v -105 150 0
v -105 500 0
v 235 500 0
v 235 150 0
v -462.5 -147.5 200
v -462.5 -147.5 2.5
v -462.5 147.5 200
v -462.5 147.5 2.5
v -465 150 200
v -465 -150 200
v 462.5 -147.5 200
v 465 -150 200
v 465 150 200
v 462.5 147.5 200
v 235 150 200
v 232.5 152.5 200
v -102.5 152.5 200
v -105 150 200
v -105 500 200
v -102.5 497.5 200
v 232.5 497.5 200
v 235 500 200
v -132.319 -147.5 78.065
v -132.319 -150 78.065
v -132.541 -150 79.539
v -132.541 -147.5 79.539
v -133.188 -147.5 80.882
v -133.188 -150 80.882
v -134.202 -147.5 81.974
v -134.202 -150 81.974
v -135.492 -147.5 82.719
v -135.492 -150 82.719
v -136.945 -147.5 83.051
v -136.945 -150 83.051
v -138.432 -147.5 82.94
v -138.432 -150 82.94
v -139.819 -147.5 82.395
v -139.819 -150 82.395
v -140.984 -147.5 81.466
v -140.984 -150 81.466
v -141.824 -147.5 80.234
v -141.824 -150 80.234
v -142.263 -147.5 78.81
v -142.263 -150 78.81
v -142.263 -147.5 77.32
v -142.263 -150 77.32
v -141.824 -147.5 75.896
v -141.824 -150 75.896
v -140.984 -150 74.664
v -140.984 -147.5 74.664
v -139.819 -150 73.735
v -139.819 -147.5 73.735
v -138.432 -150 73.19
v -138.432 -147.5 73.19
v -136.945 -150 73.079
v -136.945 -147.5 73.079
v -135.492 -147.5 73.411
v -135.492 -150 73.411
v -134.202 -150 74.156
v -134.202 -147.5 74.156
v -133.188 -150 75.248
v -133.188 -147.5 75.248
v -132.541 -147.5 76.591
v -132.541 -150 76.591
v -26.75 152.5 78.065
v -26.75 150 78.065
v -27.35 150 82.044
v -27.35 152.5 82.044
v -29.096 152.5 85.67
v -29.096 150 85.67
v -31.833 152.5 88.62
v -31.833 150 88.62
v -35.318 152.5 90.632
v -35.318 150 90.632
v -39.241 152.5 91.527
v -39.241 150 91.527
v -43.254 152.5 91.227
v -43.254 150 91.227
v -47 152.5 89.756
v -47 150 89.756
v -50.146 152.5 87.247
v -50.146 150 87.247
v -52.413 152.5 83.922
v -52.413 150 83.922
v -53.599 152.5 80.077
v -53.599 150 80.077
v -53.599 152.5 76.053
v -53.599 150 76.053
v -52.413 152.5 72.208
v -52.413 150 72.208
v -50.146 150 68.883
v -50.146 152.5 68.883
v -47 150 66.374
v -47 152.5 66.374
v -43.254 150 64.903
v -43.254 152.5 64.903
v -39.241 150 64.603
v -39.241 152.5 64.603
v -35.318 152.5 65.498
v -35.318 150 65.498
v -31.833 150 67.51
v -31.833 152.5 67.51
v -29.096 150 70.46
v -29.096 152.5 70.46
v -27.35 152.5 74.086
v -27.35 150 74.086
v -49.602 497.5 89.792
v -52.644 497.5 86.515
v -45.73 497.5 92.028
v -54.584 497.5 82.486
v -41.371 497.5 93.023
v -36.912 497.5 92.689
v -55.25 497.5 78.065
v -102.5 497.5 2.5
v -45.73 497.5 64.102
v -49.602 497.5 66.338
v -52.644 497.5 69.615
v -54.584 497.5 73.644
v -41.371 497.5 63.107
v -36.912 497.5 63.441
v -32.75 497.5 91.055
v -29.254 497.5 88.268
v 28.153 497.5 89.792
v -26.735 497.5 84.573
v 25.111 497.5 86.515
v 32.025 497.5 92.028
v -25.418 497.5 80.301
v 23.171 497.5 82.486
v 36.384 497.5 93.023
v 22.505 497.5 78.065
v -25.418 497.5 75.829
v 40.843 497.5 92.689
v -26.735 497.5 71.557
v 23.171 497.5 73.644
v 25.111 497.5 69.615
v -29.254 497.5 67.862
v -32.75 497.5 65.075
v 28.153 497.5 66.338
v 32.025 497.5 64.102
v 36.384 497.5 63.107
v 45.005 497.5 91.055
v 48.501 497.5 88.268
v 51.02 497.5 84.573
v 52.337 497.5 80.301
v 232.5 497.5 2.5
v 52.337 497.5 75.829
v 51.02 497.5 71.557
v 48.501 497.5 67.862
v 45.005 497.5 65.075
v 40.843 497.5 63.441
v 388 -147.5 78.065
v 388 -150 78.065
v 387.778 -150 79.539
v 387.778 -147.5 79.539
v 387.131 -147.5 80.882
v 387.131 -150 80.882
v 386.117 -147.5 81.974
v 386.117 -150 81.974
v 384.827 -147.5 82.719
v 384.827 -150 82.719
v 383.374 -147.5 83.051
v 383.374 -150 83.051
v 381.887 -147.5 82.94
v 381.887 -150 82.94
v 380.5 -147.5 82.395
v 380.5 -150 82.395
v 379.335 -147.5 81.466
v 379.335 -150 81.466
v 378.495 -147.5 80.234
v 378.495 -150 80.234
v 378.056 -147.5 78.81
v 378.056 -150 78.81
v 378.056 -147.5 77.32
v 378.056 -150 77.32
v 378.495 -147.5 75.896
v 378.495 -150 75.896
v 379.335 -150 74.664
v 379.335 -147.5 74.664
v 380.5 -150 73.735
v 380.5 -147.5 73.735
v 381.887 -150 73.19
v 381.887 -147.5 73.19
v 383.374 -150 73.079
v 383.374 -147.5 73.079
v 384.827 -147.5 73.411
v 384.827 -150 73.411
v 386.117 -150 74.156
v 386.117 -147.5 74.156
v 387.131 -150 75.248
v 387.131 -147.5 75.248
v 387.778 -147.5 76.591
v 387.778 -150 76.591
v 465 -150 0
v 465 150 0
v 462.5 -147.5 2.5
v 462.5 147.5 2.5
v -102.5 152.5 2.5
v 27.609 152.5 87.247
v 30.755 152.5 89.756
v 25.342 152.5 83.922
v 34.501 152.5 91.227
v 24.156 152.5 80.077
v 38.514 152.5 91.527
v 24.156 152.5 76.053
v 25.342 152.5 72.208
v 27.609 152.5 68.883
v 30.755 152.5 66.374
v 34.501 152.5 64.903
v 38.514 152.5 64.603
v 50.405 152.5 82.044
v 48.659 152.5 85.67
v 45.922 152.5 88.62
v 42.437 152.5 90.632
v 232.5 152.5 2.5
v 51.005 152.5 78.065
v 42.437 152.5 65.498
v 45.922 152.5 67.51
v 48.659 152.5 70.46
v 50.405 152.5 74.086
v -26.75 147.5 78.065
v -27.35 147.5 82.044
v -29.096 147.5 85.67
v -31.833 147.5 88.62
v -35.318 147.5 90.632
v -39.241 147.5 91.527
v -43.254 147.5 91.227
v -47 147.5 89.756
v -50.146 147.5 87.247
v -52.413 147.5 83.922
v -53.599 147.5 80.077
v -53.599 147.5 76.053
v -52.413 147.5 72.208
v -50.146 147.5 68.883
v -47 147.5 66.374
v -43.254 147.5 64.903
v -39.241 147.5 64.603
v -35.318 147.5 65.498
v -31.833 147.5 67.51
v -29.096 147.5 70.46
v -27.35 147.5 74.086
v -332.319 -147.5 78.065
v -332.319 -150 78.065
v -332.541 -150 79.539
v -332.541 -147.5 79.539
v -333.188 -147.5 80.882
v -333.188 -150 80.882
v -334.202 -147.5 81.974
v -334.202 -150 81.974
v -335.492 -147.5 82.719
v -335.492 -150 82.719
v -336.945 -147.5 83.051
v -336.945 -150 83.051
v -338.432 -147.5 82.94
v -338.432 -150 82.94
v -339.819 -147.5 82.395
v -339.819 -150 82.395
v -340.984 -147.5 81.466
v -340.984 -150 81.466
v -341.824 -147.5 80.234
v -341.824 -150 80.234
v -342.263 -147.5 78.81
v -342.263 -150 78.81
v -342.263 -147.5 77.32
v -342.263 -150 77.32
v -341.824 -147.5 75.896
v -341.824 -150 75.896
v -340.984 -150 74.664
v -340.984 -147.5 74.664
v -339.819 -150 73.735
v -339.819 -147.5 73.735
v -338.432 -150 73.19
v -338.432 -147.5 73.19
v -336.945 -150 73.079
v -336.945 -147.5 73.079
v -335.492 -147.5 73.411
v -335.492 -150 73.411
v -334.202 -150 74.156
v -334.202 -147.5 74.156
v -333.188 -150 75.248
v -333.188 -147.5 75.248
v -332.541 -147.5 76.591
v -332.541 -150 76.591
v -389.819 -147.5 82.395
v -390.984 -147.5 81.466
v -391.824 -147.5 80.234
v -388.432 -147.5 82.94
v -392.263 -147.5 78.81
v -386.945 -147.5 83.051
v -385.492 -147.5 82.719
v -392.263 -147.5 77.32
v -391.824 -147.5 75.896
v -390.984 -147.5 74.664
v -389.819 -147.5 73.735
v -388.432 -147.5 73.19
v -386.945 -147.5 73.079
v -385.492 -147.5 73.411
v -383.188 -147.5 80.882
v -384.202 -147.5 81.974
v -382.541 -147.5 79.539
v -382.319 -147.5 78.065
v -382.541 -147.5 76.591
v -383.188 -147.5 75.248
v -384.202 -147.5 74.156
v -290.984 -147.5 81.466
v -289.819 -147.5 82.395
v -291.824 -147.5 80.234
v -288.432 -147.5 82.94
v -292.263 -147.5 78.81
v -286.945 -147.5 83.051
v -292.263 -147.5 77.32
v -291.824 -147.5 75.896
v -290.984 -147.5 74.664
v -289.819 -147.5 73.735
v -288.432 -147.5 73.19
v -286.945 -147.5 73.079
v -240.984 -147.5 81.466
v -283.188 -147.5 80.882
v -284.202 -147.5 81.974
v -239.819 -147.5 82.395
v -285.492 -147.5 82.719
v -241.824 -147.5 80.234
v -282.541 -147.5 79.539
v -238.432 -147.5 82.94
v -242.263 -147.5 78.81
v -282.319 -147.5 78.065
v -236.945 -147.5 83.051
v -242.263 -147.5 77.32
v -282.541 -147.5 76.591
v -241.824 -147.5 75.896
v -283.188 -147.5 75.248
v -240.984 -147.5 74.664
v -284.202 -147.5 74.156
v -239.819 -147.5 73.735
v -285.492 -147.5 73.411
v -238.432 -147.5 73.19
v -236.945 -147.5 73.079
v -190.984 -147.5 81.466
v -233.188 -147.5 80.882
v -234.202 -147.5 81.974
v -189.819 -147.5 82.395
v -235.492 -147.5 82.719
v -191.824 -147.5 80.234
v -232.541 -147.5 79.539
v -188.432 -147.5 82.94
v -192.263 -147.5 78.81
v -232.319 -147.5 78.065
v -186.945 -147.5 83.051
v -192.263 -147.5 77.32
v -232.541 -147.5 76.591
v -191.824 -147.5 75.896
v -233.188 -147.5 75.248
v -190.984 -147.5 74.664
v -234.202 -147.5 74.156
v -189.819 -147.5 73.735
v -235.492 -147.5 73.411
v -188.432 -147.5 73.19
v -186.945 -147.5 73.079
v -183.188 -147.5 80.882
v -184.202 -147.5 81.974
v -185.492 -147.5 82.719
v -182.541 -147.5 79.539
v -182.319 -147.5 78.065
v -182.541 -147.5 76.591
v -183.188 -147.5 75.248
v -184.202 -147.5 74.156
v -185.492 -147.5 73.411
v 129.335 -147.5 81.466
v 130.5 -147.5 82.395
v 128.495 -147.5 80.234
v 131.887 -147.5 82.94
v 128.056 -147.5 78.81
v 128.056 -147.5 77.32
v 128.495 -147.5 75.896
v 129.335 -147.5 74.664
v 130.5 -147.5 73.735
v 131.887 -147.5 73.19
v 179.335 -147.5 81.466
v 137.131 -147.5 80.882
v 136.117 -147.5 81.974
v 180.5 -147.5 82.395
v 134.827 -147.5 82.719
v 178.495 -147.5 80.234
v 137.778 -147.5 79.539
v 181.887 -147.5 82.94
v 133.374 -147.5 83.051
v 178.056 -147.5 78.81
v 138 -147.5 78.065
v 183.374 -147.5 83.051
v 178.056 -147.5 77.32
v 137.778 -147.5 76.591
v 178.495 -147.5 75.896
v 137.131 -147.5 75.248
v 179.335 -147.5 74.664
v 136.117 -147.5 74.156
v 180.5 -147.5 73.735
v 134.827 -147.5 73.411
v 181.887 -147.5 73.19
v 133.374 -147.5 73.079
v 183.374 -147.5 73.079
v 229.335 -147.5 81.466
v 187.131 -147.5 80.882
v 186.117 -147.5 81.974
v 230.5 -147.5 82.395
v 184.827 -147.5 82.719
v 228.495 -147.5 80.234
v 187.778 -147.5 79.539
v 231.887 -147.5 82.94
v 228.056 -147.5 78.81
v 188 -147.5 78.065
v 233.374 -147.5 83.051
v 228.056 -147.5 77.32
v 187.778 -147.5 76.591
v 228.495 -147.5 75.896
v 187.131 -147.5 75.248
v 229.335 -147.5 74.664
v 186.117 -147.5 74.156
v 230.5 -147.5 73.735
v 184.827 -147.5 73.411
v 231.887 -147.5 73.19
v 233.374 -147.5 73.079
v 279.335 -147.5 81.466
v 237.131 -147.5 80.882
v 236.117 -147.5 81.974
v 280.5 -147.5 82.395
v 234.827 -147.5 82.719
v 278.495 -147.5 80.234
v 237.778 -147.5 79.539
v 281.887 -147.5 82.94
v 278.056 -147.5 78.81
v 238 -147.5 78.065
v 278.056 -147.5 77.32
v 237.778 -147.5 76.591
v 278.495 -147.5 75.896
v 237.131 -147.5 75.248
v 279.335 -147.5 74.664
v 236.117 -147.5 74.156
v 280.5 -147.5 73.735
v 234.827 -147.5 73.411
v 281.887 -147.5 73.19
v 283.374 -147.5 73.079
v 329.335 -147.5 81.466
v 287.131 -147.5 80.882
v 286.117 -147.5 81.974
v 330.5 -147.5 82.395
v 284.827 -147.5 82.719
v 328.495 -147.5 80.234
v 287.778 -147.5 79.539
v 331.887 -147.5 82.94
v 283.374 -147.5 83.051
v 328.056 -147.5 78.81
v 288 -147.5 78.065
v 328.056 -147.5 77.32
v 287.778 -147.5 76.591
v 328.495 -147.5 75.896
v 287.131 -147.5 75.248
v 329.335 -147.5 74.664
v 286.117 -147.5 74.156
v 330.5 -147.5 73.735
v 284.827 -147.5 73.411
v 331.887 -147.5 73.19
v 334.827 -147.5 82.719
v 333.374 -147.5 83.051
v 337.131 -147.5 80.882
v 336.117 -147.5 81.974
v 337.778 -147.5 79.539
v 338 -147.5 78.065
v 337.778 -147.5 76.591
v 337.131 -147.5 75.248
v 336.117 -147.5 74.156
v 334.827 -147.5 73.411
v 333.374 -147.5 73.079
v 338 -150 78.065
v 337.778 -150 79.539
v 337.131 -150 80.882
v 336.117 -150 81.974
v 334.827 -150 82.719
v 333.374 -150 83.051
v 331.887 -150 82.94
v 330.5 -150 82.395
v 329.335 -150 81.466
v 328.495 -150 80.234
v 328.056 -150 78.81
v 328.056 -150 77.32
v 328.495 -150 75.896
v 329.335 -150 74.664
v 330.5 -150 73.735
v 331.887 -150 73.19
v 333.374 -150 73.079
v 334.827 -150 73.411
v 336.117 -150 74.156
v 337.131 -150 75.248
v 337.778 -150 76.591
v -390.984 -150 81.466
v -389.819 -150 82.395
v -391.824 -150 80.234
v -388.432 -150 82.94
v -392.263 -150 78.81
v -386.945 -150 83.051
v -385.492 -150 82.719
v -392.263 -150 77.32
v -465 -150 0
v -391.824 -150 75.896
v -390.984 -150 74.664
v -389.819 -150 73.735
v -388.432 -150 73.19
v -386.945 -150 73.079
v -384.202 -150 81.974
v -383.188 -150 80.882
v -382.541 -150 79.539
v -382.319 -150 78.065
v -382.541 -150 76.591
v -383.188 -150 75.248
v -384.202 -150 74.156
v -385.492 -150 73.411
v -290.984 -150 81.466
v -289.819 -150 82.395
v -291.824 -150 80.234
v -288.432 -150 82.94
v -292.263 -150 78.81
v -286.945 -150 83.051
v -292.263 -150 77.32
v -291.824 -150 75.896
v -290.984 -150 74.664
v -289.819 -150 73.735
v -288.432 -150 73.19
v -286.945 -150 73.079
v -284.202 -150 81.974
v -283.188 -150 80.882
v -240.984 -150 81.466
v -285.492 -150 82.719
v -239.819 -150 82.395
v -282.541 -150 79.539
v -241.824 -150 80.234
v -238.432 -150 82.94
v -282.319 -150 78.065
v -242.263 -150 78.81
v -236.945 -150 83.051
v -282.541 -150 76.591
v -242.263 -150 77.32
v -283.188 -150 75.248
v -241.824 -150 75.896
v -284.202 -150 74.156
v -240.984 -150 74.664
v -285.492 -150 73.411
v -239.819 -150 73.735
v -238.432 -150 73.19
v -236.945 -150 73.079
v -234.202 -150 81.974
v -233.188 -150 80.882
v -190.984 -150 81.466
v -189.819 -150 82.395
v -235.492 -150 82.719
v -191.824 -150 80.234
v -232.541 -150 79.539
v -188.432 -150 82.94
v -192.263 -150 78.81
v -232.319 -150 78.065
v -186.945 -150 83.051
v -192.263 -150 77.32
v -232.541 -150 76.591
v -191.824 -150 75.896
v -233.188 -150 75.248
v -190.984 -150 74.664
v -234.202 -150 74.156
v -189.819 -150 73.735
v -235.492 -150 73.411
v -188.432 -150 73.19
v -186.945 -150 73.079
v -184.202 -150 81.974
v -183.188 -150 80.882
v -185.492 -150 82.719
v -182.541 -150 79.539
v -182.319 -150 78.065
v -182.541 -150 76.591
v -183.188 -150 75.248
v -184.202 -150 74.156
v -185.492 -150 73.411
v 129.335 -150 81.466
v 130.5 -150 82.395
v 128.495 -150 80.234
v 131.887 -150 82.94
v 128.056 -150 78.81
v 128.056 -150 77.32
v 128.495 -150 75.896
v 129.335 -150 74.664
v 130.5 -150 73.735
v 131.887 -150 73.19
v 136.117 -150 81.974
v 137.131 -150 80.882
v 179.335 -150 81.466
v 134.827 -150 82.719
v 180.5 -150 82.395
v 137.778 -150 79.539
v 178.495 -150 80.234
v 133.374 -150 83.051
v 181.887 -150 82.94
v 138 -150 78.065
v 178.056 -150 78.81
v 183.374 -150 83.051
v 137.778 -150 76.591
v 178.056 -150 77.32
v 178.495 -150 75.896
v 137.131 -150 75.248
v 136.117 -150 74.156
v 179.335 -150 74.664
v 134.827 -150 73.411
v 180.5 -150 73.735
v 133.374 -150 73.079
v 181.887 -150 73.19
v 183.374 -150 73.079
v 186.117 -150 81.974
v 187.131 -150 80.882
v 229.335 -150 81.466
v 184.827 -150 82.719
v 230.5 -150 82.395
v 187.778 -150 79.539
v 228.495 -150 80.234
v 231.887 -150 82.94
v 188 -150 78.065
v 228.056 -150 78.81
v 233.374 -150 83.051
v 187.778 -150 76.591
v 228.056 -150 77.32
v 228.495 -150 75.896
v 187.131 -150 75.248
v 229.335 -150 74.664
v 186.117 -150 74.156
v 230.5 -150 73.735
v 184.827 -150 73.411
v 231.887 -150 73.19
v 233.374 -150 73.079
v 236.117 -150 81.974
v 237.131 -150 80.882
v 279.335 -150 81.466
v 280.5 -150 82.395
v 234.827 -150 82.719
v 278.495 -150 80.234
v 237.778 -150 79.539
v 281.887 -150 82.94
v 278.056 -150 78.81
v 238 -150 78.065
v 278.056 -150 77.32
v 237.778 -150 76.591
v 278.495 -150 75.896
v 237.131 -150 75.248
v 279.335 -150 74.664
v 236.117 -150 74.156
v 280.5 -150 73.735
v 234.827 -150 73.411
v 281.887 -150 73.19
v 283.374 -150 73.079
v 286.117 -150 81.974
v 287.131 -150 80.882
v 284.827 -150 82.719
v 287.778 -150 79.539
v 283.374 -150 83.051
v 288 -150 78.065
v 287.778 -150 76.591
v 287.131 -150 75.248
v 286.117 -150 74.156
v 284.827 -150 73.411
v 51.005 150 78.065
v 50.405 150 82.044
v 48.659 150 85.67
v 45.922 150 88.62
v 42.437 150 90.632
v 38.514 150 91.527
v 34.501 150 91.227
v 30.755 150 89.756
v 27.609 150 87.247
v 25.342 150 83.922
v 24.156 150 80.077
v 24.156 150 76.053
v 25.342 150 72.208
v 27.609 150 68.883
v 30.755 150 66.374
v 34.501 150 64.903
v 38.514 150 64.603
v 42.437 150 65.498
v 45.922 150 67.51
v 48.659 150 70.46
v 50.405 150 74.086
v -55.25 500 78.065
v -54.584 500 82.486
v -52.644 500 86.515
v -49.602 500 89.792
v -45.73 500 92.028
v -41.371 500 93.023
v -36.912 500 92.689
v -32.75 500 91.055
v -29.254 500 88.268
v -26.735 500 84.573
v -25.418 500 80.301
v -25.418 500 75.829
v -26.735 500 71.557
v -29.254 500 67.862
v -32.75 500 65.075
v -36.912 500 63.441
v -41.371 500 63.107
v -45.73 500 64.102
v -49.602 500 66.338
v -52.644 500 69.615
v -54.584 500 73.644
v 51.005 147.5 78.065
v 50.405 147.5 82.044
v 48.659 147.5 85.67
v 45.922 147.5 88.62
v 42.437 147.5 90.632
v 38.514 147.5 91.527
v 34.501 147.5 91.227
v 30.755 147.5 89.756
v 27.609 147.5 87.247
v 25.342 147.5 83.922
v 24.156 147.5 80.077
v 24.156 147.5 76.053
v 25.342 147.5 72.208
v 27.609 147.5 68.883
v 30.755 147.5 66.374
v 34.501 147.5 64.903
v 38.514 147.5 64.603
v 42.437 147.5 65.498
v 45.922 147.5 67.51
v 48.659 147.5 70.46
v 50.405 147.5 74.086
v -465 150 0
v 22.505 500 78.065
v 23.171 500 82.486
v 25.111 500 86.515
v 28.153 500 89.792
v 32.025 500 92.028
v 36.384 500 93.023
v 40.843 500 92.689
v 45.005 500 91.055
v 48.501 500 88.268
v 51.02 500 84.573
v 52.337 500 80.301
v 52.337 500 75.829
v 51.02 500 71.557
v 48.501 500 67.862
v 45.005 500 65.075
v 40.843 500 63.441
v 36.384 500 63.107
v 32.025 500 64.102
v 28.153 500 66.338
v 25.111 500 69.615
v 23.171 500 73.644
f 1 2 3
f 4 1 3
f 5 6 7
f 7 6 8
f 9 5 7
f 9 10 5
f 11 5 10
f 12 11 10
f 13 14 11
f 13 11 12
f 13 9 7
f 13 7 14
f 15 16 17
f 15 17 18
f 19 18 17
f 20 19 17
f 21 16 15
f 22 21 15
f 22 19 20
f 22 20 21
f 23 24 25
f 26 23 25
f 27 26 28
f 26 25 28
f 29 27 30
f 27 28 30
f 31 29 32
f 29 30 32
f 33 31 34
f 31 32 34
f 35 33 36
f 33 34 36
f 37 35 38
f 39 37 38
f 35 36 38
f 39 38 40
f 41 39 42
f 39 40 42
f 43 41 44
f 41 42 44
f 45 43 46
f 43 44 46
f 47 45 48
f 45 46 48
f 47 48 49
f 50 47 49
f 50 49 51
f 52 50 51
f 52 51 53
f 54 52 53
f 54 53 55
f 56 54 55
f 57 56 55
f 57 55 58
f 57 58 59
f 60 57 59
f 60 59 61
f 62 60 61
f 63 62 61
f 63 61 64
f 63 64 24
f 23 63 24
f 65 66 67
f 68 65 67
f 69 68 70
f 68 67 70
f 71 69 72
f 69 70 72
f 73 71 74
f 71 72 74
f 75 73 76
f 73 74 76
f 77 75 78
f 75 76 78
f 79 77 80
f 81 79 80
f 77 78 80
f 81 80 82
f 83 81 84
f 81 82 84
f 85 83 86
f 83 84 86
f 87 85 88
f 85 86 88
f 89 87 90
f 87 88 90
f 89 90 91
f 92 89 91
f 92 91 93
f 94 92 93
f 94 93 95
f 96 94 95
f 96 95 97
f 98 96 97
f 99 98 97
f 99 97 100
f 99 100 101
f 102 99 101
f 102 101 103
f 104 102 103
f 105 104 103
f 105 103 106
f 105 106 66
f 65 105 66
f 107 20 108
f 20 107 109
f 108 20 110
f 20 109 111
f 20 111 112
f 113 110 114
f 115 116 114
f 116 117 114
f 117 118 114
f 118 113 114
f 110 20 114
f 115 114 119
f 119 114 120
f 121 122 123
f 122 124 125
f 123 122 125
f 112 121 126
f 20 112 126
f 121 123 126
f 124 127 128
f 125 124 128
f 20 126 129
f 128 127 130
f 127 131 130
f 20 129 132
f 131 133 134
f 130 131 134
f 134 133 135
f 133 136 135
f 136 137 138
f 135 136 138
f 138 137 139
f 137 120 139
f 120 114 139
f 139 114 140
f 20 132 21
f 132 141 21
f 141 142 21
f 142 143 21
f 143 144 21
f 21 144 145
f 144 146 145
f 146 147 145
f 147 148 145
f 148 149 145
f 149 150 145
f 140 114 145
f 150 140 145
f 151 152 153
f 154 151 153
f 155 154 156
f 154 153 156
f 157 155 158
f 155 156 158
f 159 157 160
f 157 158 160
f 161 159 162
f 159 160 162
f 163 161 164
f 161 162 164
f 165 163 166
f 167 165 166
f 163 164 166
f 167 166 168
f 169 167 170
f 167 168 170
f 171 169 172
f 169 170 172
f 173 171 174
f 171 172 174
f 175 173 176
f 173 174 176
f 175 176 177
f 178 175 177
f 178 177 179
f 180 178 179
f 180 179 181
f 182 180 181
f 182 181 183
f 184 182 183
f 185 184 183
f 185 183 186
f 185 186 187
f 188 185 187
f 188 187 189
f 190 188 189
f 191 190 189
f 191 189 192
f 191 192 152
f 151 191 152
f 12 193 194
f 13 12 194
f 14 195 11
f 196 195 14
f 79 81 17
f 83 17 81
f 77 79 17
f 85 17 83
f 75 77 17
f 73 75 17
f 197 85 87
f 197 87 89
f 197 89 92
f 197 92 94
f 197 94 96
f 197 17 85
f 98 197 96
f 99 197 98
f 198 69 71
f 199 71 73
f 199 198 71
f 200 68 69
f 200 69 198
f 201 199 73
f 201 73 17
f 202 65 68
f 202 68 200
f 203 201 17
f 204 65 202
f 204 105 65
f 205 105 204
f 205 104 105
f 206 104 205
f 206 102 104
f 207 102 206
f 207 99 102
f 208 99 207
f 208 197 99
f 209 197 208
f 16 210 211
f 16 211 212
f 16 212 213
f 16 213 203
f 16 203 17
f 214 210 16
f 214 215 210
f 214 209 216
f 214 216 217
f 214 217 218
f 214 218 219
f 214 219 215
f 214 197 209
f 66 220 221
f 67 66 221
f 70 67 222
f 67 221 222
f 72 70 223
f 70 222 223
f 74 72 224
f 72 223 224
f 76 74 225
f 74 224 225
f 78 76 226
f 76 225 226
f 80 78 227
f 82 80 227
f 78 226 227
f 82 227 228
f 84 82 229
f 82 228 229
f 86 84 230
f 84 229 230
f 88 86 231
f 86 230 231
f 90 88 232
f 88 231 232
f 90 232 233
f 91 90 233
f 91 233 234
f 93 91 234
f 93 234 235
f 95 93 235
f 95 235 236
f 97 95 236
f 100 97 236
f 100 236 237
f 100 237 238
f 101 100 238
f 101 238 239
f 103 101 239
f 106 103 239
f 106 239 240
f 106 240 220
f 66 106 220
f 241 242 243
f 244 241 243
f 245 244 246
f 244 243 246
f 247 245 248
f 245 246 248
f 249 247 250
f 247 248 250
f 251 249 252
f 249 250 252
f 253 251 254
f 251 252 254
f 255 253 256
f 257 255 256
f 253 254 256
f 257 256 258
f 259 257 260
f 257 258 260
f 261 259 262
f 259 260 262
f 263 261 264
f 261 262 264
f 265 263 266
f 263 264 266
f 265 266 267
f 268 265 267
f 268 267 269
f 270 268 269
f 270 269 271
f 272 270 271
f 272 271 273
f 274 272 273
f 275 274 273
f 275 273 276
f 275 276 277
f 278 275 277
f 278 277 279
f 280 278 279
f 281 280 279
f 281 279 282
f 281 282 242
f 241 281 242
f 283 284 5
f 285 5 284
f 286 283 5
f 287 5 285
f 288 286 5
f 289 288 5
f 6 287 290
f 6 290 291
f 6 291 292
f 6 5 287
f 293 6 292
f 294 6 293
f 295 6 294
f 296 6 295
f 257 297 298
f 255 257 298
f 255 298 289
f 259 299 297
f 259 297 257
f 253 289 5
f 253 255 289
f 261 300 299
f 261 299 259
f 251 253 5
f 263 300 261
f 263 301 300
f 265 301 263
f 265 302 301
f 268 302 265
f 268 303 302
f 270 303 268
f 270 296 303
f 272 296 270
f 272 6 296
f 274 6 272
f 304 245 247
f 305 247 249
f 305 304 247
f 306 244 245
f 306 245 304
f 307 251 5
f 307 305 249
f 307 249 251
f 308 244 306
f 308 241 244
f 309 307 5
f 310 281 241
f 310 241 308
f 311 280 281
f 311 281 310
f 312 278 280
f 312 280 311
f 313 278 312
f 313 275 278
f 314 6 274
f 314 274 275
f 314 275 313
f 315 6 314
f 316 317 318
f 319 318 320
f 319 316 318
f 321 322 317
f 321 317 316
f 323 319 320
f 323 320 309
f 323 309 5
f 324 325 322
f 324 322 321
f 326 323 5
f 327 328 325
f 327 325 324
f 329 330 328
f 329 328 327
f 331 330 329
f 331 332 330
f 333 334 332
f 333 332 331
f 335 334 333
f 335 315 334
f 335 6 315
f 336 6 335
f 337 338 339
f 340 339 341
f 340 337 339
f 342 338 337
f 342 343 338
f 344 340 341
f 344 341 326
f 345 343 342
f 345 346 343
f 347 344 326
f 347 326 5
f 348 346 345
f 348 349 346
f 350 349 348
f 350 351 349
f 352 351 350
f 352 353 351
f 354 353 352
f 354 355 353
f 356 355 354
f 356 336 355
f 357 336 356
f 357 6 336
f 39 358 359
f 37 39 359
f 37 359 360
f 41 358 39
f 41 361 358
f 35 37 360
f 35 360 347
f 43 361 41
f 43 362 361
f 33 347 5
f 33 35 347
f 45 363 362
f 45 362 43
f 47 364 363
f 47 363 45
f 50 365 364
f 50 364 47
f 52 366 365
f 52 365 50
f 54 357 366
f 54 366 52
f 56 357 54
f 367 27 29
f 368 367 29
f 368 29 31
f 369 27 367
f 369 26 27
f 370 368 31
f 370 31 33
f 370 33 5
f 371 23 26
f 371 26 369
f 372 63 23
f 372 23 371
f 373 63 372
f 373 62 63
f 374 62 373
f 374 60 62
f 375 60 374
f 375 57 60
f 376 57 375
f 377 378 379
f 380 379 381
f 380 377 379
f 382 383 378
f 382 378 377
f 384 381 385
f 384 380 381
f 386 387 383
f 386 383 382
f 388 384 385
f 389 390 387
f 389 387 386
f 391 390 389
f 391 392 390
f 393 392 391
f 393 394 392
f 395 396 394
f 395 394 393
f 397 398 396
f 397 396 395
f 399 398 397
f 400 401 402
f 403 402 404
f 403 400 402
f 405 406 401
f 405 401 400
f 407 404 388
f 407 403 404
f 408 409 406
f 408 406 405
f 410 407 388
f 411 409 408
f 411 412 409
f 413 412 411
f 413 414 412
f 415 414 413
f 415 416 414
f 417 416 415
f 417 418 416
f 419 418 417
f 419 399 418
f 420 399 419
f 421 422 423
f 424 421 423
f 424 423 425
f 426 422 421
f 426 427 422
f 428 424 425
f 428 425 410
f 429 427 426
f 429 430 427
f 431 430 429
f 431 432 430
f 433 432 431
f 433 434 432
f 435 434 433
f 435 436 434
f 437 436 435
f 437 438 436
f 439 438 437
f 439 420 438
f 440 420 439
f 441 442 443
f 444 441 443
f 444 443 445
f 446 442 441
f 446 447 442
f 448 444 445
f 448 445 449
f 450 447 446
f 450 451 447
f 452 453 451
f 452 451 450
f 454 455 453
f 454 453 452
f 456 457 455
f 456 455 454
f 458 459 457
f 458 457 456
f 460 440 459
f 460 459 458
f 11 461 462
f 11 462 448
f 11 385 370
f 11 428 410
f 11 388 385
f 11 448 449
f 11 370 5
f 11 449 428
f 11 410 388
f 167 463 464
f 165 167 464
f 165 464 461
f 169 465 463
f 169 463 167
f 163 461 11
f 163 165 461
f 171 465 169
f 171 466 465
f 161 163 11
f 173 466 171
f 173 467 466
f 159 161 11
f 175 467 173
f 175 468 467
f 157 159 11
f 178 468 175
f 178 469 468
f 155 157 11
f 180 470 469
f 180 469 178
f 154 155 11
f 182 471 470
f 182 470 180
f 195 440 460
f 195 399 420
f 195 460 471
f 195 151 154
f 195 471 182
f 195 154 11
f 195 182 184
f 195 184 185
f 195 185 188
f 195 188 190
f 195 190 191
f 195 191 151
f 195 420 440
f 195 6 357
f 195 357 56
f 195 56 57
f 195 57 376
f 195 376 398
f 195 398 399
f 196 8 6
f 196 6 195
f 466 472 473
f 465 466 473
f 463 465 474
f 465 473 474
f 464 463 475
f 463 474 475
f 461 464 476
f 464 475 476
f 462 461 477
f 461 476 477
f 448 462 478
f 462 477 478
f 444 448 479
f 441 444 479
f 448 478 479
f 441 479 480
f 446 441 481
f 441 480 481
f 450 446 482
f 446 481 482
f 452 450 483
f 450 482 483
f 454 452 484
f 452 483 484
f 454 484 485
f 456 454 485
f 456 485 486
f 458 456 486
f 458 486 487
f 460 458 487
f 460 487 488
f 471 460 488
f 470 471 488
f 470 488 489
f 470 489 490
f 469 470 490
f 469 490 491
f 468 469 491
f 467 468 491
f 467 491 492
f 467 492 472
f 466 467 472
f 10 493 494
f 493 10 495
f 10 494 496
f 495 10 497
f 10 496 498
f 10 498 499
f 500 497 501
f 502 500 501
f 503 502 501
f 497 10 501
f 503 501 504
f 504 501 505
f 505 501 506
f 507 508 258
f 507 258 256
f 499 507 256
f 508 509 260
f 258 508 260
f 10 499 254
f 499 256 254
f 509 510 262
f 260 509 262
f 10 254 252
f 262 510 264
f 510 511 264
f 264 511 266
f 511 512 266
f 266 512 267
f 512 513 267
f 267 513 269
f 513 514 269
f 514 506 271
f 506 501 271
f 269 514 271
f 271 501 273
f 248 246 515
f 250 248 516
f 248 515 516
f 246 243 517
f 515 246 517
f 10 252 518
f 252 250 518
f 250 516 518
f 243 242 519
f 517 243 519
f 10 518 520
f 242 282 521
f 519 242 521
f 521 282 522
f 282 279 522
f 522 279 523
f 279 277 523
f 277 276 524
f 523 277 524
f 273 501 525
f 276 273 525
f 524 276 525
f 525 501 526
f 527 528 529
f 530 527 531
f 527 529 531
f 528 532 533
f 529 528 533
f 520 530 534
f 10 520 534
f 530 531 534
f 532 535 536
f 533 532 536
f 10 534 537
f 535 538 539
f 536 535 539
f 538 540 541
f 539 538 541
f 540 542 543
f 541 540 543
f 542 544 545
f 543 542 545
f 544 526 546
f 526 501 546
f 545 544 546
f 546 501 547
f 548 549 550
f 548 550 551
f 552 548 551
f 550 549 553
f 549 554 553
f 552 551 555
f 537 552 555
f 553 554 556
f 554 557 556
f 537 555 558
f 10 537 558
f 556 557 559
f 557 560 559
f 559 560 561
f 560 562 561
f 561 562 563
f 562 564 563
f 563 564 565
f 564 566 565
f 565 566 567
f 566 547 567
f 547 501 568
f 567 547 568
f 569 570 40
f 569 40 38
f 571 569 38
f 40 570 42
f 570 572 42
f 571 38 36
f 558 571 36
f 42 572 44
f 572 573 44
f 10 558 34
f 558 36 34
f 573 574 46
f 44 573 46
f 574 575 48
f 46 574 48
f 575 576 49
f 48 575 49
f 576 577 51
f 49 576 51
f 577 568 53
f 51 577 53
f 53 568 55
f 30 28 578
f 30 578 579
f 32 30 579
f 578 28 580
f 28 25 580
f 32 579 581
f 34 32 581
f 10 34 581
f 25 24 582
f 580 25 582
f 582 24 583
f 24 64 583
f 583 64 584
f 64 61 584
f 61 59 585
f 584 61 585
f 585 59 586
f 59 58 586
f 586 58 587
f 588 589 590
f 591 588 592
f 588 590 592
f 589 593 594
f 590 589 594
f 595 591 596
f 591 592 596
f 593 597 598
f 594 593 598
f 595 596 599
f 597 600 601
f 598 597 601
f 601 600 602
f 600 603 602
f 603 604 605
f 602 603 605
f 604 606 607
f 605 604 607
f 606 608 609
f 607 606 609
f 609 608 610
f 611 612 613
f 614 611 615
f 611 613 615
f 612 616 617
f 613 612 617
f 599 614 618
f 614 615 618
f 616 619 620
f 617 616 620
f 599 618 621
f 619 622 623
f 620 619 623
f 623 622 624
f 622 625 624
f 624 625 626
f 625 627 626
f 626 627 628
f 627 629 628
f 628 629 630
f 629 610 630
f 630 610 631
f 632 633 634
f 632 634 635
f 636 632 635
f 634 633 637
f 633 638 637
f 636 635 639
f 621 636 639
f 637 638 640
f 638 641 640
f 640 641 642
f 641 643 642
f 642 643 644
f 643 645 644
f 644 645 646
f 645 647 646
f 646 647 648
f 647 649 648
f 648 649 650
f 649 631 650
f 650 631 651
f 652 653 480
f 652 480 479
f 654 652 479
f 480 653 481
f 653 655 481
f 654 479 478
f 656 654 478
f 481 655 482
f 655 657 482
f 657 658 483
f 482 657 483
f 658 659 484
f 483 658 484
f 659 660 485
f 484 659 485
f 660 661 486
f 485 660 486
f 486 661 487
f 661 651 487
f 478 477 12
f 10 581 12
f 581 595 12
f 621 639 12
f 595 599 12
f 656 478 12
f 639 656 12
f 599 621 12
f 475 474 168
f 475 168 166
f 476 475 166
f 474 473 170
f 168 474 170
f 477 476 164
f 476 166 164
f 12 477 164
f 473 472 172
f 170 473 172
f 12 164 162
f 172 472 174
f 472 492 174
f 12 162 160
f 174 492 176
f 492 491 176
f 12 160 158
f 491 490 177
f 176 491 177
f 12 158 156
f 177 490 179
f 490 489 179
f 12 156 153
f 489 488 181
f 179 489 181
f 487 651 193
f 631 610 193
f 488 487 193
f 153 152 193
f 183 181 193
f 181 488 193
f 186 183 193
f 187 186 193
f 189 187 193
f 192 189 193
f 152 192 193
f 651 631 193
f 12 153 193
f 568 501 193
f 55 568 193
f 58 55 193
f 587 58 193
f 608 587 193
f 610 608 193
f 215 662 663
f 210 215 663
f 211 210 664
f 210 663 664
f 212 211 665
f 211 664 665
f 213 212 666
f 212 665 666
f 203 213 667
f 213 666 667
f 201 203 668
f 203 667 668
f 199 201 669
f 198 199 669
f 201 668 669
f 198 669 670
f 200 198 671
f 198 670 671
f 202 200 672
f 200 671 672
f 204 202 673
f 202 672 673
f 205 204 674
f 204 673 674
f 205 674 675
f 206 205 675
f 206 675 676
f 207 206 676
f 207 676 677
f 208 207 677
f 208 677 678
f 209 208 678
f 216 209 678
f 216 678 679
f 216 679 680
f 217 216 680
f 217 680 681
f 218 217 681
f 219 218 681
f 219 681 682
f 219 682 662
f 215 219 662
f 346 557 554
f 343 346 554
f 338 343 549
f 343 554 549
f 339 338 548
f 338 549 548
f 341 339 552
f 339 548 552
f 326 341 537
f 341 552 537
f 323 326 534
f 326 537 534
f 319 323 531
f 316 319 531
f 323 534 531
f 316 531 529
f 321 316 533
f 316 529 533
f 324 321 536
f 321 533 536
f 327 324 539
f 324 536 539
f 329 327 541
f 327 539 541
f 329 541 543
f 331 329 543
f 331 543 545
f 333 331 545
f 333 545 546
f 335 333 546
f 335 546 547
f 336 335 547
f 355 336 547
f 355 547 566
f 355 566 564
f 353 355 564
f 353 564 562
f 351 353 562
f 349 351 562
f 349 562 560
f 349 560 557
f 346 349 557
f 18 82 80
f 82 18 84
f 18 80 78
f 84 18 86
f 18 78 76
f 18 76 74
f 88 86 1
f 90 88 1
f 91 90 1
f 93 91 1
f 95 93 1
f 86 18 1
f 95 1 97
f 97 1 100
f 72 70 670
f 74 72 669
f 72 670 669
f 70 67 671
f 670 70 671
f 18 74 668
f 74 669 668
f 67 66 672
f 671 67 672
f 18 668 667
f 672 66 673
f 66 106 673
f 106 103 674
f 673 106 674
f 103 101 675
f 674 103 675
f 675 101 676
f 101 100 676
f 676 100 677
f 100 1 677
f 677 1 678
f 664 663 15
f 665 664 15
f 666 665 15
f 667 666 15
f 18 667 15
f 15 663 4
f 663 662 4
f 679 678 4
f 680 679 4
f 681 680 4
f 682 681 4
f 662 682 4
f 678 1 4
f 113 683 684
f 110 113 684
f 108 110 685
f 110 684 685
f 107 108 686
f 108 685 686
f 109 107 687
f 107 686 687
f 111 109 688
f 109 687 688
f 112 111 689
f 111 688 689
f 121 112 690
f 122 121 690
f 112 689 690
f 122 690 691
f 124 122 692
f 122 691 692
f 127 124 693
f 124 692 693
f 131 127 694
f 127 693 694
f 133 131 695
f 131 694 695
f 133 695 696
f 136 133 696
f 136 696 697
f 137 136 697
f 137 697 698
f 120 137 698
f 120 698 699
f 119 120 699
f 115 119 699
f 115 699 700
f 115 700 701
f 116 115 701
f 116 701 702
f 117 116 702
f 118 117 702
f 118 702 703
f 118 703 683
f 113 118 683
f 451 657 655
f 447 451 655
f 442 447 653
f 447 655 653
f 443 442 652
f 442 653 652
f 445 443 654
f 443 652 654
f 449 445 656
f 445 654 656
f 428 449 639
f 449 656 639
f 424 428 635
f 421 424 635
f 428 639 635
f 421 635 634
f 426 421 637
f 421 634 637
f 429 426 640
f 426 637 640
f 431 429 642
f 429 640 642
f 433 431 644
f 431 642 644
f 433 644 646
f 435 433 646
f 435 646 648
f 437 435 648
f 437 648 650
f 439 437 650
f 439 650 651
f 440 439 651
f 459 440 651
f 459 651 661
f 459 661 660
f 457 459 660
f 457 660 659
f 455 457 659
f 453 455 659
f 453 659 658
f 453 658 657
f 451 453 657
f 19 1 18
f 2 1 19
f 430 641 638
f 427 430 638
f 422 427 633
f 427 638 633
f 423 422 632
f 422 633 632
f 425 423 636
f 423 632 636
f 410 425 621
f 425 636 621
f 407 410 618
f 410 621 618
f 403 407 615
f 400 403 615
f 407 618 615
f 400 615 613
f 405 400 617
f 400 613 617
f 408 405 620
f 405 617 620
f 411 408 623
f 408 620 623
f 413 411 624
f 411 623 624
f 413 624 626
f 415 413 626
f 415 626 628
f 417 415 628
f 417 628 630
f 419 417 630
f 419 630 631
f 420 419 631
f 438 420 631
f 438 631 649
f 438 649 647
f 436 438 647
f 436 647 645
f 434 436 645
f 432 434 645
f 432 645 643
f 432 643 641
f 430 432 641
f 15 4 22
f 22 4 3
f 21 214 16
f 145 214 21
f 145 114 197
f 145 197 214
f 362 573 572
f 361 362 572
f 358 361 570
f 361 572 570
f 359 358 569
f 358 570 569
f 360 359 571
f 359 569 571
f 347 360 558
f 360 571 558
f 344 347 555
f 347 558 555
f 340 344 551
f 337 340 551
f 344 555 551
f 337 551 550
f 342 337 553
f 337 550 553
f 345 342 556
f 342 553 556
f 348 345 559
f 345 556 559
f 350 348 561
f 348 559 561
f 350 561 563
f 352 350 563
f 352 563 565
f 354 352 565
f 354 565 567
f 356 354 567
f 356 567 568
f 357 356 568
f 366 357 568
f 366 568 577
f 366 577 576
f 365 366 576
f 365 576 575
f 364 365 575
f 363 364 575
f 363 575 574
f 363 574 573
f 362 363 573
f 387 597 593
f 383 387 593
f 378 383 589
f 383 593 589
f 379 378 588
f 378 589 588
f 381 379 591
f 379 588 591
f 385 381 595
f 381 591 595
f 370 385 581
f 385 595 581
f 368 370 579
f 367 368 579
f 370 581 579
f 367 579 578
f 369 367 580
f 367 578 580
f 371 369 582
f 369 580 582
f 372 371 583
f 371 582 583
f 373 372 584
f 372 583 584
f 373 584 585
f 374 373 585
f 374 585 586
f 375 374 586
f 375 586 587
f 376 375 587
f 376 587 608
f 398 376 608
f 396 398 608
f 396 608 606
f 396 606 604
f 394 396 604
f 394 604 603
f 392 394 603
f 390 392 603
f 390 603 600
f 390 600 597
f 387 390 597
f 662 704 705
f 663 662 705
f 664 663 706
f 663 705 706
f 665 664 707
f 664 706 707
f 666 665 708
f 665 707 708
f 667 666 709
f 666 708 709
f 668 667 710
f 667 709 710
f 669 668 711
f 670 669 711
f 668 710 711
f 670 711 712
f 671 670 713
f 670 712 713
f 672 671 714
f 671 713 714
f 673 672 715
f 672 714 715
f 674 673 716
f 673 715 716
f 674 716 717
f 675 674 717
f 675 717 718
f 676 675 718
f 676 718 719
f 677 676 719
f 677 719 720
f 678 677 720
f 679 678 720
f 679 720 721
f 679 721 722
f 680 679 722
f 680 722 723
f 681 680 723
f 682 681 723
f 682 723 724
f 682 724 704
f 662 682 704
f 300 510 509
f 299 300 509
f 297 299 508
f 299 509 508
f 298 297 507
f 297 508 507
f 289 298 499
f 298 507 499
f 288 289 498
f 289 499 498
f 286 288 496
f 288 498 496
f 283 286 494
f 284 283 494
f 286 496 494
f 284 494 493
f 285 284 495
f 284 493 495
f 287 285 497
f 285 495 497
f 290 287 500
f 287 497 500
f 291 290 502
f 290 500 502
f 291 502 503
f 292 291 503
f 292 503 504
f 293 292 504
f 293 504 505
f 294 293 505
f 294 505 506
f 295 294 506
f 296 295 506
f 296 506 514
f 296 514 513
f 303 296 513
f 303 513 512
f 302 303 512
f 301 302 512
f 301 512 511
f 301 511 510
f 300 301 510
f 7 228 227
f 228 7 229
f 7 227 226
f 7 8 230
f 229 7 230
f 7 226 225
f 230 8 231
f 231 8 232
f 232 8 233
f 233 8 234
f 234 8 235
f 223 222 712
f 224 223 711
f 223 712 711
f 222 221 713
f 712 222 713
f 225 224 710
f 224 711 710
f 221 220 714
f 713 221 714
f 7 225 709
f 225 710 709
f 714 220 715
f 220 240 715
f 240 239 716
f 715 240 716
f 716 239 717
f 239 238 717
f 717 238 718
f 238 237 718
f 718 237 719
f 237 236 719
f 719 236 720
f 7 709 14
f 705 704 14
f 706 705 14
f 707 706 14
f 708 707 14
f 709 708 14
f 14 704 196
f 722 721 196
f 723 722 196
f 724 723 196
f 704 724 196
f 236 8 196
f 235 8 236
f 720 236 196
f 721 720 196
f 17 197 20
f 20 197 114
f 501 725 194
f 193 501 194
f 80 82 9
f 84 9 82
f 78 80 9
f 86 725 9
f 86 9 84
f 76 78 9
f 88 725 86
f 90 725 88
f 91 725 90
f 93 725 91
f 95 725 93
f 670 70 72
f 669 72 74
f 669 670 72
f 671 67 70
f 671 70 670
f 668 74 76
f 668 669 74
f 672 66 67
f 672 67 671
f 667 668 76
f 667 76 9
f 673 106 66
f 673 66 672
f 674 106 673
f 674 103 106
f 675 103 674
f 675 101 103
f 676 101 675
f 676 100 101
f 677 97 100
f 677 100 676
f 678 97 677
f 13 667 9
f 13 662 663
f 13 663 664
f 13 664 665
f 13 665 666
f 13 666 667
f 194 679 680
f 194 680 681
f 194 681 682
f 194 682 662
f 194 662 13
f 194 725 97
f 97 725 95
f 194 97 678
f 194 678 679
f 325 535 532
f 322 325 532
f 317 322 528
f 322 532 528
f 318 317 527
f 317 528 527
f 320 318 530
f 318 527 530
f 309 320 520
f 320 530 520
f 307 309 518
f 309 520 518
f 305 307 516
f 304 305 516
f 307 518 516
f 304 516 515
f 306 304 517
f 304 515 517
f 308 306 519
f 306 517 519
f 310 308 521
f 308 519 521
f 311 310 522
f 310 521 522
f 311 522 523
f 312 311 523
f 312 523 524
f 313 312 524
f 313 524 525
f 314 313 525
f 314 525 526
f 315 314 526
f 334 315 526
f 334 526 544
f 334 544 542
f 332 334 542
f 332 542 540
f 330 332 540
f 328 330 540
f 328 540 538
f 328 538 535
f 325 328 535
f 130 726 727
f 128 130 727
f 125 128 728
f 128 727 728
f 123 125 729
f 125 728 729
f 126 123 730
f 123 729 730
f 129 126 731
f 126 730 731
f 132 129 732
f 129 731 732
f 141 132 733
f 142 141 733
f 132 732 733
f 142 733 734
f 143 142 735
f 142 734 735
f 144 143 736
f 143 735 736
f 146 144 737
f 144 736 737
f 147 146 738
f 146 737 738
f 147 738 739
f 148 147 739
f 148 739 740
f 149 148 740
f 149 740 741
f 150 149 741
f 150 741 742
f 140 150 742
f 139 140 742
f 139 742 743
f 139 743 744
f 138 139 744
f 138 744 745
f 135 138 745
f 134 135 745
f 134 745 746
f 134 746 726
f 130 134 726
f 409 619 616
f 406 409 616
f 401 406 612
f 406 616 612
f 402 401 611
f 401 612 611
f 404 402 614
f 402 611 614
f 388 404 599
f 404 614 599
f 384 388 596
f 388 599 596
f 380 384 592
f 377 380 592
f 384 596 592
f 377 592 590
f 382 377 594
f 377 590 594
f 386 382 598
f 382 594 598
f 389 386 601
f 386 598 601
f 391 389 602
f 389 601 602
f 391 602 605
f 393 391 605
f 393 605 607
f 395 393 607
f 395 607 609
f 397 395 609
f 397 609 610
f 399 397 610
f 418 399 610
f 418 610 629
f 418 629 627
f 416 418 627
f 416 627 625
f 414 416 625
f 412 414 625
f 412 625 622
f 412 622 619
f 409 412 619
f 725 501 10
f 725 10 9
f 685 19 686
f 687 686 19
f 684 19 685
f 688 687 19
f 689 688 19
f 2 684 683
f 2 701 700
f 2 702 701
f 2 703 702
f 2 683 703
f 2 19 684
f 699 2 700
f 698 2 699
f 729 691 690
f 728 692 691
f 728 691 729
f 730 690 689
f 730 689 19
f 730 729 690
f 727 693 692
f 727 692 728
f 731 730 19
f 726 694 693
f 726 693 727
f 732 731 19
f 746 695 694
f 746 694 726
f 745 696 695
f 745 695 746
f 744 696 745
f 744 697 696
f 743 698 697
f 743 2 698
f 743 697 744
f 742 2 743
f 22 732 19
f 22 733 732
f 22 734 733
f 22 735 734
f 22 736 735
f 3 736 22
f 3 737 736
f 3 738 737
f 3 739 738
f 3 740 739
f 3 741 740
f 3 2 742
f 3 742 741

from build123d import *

# Parameters (mm, degrees)
F0_W      = 930
F0_H      = 300
F2_DEPTH  = 200
F3_T      = -2.5
F1_W      = 340
F1_H      = 350
F4_DEPTH  = 200
F5_T      = -2.5
F6_R      = 5
F7_DEPTH  = 25
F8_R      = 13.5
F9_DEPTH  = 25
F10_R     = 15
F11_DEPTH = 25


# Not quite as in the source:
# - a feature names something its author has since deleted; it is built from what else it names


with BuildPart() as f2:
    # F0 (on Top) → F2 (new body)
    with BuildSketch(Plane.XY):
        Rectangle(F0_W, F0_H)
    extrude(amount=F2_DEPTH)

    # F3
    f3_openings = [f2.faces().sort_by_distance(p)[0] for p in [
        (0, 0, 200),
    ]]
    offset(amount=F3_T, openings=f3_openings)

    # F6 (on face) → F7 (cut)
    with BuildSketch(Plane.XZ.offset(150)):
        with Locations((133, 78.065)):
            Circle(F6_R)
        with Locations((183, 78.065)):
            Circle(F6_R)
        with Locations((233, 78.065)):
            Circle(F6_R)
        with Locations((283, 78.065)):
            Circle(F6_R)
        with Locations((383, 78.065)):
            Circle(F6_R)
        with Locations((333, 78.065)):
            Circle(F6_R)
        with Locations((-137.319, 78.065)):
            Circle(F6_R)
        with Locations((-187.319, 78.065)):
            Circle(F6_R)
        with Locations((-237.319, 78.065)):
            Circle(F6_R)
        with Locations((-287.319, 78.065)):
            Circle(F6_R)
        with Locations((-337.319, 78.065)):
            Circle(F6_R)
        with Locations((-387.319, 78.065)):
            Circle(F6_R)
    extrude(amount=-F7_DEPTH, mode=Mode.SUBTRACT)


with BuildPart() as f4:
    # F1 (on Top) → F4 (new body)
    with BuildSketch(Plane.XY):
        with Locations((65, 325)):
            Rectangle(F1_W, F1_H)
    extrude(amount=F4_DEPTH)

    # F5
    f5_openings = [f4.faces().sort_by_distance(p)[0] for p in [
        (65, 325, 200),
    ]]
    offset(amount=F5_T, openings=f5_openings)


with BuildPart() as f9_tool:
    # F8 (on face) → F9 (new body)
    with BuildSketch(Plane.XZ.offset(-147.5)):
        with Locations((37.505, 78.065)):
            Circle(F8_R)
        with Locations((-40.25, 78.065)):
            Circle(F8_R)
    extrude(amount=-F9_DEPTH)


with BuildPart() as f2_1:
    add(f2.part)

    # F9: cut by f9_tool
    add(f9_tool.part, mode=Mode.SUBTRACT)


with BuildPart() as f4_1:
    add(f4.part)

    # F9: cut by f9_tool
    add(f9_tool.part, mode=Mode.SUBTRACT)

    # F10 (on face) → F11 (cut)
    with BuildSketch(Plane(origin=(0, 500, 0), x_dir=(-1, 0, 0), z_dir=(0, 1, 0))):
        with Locations((-37.505, 78.065)):
            Circle(F10_R)
        with Locations((40.25, 78.065)):
            Circle(F10_R)
    extrude(amount=-F11_DEPTH, mode=Mode.SUBTRACT)


solid = Compound([f2_1.part, f4_1.part])
